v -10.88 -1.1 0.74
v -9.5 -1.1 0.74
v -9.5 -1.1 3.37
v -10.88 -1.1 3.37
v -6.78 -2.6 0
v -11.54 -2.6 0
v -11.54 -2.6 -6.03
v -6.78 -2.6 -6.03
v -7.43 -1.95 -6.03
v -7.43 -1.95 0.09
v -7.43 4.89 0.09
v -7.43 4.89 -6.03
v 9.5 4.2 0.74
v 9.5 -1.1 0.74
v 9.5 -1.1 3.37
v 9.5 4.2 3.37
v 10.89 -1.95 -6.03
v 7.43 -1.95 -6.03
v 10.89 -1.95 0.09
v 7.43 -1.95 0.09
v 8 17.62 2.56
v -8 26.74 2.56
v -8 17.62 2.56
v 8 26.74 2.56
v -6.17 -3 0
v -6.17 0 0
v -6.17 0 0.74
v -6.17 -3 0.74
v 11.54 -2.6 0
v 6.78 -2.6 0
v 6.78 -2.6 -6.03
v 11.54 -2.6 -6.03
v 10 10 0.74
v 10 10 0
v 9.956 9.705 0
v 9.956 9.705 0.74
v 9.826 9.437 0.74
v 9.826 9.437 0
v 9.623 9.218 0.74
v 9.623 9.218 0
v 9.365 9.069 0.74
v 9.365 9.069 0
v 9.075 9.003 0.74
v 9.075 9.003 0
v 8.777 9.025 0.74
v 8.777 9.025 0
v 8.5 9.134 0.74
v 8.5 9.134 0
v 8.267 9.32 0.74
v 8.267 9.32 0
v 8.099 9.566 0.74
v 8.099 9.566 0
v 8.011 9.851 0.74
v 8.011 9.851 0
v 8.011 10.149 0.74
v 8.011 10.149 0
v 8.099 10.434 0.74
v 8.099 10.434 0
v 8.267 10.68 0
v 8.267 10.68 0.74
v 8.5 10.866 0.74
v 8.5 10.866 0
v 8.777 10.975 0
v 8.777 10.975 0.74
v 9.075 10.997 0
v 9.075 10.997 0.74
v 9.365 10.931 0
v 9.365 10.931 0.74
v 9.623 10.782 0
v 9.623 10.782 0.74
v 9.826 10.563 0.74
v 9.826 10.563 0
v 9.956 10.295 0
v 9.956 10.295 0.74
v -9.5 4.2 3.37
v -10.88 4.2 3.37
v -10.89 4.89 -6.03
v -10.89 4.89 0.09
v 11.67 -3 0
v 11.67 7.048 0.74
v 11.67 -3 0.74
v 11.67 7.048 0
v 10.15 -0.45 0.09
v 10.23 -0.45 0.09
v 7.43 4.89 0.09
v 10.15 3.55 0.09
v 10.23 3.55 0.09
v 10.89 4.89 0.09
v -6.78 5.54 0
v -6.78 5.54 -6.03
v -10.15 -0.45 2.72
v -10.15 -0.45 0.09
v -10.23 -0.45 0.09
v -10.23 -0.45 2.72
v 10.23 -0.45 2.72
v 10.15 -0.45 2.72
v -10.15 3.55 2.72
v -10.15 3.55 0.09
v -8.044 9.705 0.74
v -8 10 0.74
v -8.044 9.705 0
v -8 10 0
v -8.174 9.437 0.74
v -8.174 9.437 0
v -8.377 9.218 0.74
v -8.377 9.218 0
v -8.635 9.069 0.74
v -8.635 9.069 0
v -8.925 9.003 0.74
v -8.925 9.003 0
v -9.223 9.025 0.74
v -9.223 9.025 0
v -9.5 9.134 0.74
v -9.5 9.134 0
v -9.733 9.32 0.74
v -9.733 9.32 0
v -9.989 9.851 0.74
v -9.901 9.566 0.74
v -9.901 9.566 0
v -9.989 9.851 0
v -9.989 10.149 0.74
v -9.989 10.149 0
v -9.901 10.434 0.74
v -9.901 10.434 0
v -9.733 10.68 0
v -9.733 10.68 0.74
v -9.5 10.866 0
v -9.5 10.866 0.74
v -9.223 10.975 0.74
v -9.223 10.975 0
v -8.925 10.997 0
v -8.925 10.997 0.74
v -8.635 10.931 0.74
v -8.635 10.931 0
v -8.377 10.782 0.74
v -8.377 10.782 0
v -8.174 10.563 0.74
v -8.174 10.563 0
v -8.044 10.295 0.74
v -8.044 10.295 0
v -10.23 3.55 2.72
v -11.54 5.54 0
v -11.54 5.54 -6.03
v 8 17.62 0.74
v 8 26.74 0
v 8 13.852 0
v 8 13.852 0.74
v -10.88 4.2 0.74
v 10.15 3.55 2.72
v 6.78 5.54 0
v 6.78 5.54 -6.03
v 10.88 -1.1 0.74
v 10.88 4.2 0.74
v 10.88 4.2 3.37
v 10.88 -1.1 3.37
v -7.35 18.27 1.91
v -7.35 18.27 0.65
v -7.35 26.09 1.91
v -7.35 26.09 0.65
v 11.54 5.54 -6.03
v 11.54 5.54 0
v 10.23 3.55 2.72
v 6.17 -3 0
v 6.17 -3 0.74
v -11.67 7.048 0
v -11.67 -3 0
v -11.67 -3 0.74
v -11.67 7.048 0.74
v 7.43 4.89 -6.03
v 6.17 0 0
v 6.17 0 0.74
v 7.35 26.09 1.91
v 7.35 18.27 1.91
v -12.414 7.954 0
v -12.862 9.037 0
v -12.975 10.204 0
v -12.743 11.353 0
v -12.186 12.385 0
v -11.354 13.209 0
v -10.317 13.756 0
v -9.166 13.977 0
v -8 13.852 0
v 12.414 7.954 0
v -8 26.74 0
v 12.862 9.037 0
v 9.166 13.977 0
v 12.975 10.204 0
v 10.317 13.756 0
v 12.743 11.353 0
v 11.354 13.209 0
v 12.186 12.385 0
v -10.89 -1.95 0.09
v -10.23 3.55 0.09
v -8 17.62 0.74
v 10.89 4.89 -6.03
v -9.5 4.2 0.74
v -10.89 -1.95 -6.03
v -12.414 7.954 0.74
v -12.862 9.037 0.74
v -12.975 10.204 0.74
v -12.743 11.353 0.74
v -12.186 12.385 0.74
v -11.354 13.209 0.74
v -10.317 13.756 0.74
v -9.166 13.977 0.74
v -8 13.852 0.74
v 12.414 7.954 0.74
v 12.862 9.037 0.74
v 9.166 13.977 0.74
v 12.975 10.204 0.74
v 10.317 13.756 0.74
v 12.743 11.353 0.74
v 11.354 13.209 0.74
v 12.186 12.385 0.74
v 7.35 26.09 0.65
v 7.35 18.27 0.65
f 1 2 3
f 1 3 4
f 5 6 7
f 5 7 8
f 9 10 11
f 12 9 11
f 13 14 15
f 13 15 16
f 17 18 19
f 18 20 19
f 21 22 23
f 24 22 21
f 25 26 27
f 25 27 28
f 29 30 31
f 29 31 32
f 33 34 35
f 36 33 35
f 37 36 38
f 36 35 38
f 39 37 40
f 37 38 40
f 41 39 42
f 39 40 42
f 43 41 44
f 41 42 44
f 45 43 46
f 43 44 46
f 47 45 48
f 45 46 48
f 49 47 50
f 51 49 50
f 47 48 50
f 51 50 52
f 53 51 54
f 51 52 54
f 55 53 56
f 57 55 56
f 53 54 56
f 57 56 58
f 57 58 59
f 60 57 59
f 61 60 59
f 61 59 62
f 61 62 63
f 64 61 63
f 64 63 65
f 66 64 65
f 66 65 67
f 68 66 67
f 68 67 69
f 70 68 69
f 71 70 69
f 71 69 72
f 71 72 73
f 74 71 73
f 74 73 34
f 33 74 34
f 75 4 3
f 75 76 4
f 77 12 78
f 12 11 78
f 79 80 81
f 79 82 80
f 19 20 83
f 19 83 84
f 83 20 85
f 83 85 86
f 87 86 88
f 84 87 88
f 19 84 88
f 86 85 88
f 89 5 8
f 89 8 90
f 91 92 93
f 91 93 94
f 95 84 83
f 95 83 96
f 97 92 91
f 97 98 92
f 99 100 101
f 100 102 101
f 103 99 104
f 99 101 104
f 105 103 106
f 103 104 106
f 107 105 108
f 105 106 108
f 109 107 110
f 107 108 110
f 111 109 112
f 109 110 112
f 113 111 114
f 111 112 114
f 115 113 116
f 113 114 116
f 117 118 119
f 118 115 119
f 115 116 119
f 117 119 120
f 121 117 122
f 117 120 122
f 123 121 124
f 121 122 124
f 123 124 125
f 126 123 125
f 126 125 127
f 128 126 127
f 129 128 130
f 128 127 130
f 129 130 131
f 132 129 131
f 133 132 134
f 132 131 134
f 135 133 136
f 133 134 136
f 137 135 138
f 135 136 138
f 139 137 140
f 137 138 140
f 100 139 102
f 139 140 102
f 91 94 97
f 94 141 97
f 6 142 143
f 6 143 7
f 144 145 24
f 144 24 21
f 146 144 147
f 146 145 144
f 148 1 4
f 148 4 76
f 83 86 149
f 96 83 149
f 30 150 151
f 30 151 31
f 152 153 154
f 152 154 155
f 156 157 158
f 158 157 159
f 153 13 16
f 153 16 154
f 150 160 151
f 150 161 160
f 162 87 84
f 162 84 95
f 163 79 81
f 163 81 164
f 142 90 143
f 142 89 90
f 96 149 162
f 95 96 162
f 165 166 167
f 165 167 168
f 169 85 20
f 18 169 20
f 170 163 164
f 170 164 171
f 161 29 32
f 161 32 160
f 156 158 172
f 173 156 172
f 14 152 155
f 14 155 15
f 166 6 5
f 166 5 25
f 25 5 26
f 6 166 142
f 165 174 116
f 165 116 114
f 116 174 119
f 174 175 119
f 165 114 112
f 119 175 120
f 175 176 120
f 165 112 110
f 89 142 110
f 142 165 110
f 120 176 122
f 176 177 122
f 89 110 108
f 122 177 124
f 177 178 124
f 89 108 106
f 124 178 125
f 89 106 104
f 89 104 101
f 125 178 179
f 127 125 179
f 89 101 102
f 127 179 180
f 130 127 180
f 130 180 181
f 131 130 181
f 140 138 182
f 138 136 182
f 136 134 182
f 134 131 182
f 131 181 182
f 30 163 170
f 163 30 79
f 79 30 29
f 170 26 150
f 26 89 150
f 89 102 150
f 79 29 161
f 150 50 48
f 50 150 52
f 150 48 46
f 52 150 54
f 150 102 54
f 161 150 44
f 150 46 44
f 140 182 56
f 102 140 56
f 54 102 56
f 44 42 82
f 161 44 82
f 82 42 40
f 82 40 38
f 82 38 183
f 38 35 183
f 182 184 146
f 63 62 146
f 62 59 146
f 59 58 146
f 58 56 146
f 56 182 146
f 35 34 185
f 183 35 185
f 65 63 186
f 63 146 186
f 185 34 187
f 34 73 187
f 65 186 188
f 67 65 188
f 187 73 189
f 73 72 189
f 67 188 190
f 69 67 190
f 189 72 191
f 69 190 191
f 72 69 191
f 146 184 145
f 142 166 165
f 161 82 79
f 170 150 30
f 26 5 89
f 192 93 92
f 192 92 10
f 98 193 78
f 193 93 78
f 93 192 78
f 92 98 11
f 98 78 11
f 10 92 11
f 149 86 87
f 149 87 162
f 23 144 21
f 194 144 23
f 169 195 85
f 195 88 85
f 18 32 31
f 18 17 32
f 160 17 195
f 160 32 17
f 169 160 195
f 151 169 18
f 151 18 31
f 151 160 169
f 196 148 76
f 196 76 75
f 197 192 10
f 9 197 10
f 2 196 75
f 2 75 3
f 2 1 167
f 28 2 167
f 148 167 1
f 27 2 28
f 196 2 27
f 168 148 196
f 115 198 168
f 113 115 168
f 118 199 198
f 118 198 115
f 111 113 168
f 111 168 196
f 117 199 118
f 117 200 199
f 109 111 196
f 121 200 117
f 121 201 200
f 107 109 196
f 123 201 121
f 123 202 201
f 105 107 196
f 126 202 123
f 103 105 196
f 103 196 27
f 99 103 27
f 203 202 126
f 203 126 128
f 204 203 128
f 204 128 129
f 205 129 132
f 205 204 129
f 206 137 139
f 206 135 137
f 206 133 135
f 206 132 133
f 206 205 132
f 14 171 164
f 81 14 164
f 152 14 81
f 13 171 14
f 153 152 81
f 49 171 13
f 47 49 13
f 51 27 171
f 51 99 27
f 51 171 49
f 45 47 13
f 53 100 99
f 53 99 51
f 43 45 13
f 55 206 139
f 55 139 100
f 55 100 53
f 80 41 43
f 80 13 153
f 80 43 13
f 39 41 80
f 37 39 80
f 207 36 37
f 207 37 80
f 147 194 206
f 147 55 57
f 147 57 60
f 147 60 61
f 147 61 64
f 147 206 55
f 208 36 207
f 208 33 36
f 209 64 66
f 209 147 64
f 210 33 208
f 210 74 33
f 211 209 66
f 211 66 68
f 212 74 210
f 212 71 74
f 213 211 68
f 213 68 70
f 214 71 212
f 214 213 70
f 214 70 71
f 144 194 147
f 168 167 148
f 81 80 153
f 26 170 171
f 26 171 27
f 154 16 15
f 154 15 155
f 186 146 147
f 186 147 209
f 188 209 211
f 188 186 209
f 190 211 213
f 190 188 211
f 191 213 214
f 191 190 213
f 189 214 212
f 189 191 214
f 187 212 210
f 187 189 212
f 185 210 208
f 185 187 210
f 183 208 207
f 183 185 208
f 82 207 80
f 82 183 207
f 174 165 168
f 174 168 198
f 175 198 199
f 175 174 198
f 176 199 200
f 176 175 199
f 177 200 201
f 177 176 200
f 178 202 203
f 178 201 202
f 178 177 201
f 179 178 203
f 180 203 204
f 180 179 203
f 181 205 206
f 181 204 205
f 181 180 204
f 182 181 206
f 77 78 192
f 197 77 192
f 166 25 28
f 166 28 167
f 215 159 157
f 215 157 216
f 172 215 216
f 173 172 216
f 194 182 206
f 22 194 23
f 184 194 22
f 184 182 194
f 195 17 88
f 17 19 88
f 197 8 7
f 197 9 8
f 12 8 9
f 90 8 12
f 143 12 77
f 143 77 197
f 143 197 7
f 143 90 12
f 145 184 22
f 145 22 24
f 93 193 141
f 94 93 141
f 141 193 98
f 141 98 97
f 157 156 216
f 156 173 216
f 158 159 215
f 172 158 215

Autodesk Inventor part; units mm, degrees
ref_plane "YZ Plane" through (0, 0, 0) normal (1, 0, 0) x (0, 1, 0)
ref_plane "XZ Plane" through (0, 0, 0) normal (0, 1, 0) x (-1, 0, 0)
ref_plane "XY Plane" through (0, 0, 0) normal (0, 0, 1) x (1, 0, 0)
sketch "Boceto1" plane through (0, 0, 0) normal (0, 0, 1) x (1, 0, 0)
  line L0 (-8, 26.74) -> (8, 26.74)
  line L1 (8, 26.74) -> (8, 0)
  line L2 (8, 0) -> (-8, 0)
  line L3 (-8, 0) -> (-8, 26.74)
  line L4 (6.17, 7.0485) -> (11.67, 7.0485)
  line L5 (11.67, 7.0485) -> (11.67, -3)
  line L6 (11.67, -3) -> (6.17, -3)
  line L7 (6.17, -3) -> (6.17, 7.0485)
  line L8 (-11.67, 7.0485) -> (-6.17, 7.0485)
  line L9 (-6.17, 7.0485) -> (-6.17, -3)
  line L10 (-6.17, -3) -> (-11.67, -3)
  line L11 (-11.67, -3) -> (-11.67, 7.0485)
  circle A0 centre (-9, 10) radius 1
  circle A1 centre (9, 10) radius 1
  circle A2 centre (-9, 10) radius 3.98
  circle A3 centre (9, 10) radius 3.98
  point P0 (0, 0)
  point P1 (0, 0)
  dimension "d0" = 16
  dimension "d1" = 26.74
  dimension "d2" = 5.5
  dimension "d3" = 23.34
  dimension "d6" = 11.67
  dimension "d7" = 29.74
  dimension "d8" = 2
  dimension "d9" = 25.96
  dimension "d10" = 13
extrude "Extrusión1" add sketch "Boceto1" along normal blind 0.74
sketch "Boceto2" plane through (0, 0, 0.74) normal (0, 0, 1) x (1, 0, 0)
  line L0 (-8, 26.74) -> (8, 26.74)
  line L1 (8, 26.74) -> (8, 17.62)
  line L2 (8, 17.62) -> (-8, 17.62)
  line L3 (-8, 17.62) -> (-8, 26.74)
  point P0 (0, 0)
  dimension "d13" = 9.12
extrude "Extrusión2" add sketch "Boceto2" along normal blind 1.82
sketch "Boceto3" plane through (0, 0, 0.74) normal (0, 0, 1) x (1, 0, 0)
  line L0 (9.5, 4.2) -> (10.88, 4.2)
  line L1 (10.88, 4.2) -> (10.88, -1.1)
  line L2 (10.88, -1.1) -> (9.5, -1.1)
  line L3 (9.5, -1.1) -> (9.5, 4.2)
  line L4 (-10.88, 4.2) -> (-9.5, 4.2)
  line L5 (-9.5, 4.2) -> (-9.5, -1.1)
  line L6 (-9.5, -1.1) -> (-10.88, -1.1)
  line L7 (-10.88, -1.1) -> (-10.88, 4.2)
  line L8 (-11.67, 7.0485) -> (-11.67, -3) projected
  line L9 (6.17, -3) -> (11.67, -3) projected
  point P0 (0, 0)
  dimension "d16" = 5.3
  dimension "d17" = 1.38
  dimension "d18" = 19
  dimension "d19" = 0.79
  dimension "d20" = 7.2
extrude "Extrusión3" add sketch "Boceto3" along normal blind 2.63
sketch "Boceto4" plane through (0, 0, 0) normal (0, 0, -1) x (-1, 0, 0)
  line L0 (-6.78, -2.6) -> (-11.54, -2.6)
  line L1 (-11.54, -2.6) -> (-11.54, 5.54)
  line L2 (-11.54, 5.54) -> (-6.78, 5.54)
  line L3 (-6.78, 5.54) -> (-6.78, -2.6)
  line L4 (11.54, -2.6) -> (6.78, -2.6)
  line L5 (6.78, -2.6) -> (6.78, 5.54)
  line L6 (6.78, 5.54) -> (11.54, 5.54)
  line L7 (11.54, 5.54) -> (11.54, -2.6)
  line L8 (8, 26.74) -> (-8, 26.74) projected
  point P0 (0, 0)
  dimension "d23" = 4.76
  dimension "d24" = 23.08
  dimension "d25" = 29.34
  dimension "d26" = 11.54
  dimension "d27" = 8.14
extrude "Extrusión4" add sketch "Boceto4" along normal blind 6.03
shell "Vaciado1" thickness 0.65 removed faces 2 at (8.3667, 0.1133, -6.03) at (-8.3667, 2.8267, -6.03)
equation "\"d26\" = 0.5 * d24"
properties part number "Encoder" material "Plástico ABS"
